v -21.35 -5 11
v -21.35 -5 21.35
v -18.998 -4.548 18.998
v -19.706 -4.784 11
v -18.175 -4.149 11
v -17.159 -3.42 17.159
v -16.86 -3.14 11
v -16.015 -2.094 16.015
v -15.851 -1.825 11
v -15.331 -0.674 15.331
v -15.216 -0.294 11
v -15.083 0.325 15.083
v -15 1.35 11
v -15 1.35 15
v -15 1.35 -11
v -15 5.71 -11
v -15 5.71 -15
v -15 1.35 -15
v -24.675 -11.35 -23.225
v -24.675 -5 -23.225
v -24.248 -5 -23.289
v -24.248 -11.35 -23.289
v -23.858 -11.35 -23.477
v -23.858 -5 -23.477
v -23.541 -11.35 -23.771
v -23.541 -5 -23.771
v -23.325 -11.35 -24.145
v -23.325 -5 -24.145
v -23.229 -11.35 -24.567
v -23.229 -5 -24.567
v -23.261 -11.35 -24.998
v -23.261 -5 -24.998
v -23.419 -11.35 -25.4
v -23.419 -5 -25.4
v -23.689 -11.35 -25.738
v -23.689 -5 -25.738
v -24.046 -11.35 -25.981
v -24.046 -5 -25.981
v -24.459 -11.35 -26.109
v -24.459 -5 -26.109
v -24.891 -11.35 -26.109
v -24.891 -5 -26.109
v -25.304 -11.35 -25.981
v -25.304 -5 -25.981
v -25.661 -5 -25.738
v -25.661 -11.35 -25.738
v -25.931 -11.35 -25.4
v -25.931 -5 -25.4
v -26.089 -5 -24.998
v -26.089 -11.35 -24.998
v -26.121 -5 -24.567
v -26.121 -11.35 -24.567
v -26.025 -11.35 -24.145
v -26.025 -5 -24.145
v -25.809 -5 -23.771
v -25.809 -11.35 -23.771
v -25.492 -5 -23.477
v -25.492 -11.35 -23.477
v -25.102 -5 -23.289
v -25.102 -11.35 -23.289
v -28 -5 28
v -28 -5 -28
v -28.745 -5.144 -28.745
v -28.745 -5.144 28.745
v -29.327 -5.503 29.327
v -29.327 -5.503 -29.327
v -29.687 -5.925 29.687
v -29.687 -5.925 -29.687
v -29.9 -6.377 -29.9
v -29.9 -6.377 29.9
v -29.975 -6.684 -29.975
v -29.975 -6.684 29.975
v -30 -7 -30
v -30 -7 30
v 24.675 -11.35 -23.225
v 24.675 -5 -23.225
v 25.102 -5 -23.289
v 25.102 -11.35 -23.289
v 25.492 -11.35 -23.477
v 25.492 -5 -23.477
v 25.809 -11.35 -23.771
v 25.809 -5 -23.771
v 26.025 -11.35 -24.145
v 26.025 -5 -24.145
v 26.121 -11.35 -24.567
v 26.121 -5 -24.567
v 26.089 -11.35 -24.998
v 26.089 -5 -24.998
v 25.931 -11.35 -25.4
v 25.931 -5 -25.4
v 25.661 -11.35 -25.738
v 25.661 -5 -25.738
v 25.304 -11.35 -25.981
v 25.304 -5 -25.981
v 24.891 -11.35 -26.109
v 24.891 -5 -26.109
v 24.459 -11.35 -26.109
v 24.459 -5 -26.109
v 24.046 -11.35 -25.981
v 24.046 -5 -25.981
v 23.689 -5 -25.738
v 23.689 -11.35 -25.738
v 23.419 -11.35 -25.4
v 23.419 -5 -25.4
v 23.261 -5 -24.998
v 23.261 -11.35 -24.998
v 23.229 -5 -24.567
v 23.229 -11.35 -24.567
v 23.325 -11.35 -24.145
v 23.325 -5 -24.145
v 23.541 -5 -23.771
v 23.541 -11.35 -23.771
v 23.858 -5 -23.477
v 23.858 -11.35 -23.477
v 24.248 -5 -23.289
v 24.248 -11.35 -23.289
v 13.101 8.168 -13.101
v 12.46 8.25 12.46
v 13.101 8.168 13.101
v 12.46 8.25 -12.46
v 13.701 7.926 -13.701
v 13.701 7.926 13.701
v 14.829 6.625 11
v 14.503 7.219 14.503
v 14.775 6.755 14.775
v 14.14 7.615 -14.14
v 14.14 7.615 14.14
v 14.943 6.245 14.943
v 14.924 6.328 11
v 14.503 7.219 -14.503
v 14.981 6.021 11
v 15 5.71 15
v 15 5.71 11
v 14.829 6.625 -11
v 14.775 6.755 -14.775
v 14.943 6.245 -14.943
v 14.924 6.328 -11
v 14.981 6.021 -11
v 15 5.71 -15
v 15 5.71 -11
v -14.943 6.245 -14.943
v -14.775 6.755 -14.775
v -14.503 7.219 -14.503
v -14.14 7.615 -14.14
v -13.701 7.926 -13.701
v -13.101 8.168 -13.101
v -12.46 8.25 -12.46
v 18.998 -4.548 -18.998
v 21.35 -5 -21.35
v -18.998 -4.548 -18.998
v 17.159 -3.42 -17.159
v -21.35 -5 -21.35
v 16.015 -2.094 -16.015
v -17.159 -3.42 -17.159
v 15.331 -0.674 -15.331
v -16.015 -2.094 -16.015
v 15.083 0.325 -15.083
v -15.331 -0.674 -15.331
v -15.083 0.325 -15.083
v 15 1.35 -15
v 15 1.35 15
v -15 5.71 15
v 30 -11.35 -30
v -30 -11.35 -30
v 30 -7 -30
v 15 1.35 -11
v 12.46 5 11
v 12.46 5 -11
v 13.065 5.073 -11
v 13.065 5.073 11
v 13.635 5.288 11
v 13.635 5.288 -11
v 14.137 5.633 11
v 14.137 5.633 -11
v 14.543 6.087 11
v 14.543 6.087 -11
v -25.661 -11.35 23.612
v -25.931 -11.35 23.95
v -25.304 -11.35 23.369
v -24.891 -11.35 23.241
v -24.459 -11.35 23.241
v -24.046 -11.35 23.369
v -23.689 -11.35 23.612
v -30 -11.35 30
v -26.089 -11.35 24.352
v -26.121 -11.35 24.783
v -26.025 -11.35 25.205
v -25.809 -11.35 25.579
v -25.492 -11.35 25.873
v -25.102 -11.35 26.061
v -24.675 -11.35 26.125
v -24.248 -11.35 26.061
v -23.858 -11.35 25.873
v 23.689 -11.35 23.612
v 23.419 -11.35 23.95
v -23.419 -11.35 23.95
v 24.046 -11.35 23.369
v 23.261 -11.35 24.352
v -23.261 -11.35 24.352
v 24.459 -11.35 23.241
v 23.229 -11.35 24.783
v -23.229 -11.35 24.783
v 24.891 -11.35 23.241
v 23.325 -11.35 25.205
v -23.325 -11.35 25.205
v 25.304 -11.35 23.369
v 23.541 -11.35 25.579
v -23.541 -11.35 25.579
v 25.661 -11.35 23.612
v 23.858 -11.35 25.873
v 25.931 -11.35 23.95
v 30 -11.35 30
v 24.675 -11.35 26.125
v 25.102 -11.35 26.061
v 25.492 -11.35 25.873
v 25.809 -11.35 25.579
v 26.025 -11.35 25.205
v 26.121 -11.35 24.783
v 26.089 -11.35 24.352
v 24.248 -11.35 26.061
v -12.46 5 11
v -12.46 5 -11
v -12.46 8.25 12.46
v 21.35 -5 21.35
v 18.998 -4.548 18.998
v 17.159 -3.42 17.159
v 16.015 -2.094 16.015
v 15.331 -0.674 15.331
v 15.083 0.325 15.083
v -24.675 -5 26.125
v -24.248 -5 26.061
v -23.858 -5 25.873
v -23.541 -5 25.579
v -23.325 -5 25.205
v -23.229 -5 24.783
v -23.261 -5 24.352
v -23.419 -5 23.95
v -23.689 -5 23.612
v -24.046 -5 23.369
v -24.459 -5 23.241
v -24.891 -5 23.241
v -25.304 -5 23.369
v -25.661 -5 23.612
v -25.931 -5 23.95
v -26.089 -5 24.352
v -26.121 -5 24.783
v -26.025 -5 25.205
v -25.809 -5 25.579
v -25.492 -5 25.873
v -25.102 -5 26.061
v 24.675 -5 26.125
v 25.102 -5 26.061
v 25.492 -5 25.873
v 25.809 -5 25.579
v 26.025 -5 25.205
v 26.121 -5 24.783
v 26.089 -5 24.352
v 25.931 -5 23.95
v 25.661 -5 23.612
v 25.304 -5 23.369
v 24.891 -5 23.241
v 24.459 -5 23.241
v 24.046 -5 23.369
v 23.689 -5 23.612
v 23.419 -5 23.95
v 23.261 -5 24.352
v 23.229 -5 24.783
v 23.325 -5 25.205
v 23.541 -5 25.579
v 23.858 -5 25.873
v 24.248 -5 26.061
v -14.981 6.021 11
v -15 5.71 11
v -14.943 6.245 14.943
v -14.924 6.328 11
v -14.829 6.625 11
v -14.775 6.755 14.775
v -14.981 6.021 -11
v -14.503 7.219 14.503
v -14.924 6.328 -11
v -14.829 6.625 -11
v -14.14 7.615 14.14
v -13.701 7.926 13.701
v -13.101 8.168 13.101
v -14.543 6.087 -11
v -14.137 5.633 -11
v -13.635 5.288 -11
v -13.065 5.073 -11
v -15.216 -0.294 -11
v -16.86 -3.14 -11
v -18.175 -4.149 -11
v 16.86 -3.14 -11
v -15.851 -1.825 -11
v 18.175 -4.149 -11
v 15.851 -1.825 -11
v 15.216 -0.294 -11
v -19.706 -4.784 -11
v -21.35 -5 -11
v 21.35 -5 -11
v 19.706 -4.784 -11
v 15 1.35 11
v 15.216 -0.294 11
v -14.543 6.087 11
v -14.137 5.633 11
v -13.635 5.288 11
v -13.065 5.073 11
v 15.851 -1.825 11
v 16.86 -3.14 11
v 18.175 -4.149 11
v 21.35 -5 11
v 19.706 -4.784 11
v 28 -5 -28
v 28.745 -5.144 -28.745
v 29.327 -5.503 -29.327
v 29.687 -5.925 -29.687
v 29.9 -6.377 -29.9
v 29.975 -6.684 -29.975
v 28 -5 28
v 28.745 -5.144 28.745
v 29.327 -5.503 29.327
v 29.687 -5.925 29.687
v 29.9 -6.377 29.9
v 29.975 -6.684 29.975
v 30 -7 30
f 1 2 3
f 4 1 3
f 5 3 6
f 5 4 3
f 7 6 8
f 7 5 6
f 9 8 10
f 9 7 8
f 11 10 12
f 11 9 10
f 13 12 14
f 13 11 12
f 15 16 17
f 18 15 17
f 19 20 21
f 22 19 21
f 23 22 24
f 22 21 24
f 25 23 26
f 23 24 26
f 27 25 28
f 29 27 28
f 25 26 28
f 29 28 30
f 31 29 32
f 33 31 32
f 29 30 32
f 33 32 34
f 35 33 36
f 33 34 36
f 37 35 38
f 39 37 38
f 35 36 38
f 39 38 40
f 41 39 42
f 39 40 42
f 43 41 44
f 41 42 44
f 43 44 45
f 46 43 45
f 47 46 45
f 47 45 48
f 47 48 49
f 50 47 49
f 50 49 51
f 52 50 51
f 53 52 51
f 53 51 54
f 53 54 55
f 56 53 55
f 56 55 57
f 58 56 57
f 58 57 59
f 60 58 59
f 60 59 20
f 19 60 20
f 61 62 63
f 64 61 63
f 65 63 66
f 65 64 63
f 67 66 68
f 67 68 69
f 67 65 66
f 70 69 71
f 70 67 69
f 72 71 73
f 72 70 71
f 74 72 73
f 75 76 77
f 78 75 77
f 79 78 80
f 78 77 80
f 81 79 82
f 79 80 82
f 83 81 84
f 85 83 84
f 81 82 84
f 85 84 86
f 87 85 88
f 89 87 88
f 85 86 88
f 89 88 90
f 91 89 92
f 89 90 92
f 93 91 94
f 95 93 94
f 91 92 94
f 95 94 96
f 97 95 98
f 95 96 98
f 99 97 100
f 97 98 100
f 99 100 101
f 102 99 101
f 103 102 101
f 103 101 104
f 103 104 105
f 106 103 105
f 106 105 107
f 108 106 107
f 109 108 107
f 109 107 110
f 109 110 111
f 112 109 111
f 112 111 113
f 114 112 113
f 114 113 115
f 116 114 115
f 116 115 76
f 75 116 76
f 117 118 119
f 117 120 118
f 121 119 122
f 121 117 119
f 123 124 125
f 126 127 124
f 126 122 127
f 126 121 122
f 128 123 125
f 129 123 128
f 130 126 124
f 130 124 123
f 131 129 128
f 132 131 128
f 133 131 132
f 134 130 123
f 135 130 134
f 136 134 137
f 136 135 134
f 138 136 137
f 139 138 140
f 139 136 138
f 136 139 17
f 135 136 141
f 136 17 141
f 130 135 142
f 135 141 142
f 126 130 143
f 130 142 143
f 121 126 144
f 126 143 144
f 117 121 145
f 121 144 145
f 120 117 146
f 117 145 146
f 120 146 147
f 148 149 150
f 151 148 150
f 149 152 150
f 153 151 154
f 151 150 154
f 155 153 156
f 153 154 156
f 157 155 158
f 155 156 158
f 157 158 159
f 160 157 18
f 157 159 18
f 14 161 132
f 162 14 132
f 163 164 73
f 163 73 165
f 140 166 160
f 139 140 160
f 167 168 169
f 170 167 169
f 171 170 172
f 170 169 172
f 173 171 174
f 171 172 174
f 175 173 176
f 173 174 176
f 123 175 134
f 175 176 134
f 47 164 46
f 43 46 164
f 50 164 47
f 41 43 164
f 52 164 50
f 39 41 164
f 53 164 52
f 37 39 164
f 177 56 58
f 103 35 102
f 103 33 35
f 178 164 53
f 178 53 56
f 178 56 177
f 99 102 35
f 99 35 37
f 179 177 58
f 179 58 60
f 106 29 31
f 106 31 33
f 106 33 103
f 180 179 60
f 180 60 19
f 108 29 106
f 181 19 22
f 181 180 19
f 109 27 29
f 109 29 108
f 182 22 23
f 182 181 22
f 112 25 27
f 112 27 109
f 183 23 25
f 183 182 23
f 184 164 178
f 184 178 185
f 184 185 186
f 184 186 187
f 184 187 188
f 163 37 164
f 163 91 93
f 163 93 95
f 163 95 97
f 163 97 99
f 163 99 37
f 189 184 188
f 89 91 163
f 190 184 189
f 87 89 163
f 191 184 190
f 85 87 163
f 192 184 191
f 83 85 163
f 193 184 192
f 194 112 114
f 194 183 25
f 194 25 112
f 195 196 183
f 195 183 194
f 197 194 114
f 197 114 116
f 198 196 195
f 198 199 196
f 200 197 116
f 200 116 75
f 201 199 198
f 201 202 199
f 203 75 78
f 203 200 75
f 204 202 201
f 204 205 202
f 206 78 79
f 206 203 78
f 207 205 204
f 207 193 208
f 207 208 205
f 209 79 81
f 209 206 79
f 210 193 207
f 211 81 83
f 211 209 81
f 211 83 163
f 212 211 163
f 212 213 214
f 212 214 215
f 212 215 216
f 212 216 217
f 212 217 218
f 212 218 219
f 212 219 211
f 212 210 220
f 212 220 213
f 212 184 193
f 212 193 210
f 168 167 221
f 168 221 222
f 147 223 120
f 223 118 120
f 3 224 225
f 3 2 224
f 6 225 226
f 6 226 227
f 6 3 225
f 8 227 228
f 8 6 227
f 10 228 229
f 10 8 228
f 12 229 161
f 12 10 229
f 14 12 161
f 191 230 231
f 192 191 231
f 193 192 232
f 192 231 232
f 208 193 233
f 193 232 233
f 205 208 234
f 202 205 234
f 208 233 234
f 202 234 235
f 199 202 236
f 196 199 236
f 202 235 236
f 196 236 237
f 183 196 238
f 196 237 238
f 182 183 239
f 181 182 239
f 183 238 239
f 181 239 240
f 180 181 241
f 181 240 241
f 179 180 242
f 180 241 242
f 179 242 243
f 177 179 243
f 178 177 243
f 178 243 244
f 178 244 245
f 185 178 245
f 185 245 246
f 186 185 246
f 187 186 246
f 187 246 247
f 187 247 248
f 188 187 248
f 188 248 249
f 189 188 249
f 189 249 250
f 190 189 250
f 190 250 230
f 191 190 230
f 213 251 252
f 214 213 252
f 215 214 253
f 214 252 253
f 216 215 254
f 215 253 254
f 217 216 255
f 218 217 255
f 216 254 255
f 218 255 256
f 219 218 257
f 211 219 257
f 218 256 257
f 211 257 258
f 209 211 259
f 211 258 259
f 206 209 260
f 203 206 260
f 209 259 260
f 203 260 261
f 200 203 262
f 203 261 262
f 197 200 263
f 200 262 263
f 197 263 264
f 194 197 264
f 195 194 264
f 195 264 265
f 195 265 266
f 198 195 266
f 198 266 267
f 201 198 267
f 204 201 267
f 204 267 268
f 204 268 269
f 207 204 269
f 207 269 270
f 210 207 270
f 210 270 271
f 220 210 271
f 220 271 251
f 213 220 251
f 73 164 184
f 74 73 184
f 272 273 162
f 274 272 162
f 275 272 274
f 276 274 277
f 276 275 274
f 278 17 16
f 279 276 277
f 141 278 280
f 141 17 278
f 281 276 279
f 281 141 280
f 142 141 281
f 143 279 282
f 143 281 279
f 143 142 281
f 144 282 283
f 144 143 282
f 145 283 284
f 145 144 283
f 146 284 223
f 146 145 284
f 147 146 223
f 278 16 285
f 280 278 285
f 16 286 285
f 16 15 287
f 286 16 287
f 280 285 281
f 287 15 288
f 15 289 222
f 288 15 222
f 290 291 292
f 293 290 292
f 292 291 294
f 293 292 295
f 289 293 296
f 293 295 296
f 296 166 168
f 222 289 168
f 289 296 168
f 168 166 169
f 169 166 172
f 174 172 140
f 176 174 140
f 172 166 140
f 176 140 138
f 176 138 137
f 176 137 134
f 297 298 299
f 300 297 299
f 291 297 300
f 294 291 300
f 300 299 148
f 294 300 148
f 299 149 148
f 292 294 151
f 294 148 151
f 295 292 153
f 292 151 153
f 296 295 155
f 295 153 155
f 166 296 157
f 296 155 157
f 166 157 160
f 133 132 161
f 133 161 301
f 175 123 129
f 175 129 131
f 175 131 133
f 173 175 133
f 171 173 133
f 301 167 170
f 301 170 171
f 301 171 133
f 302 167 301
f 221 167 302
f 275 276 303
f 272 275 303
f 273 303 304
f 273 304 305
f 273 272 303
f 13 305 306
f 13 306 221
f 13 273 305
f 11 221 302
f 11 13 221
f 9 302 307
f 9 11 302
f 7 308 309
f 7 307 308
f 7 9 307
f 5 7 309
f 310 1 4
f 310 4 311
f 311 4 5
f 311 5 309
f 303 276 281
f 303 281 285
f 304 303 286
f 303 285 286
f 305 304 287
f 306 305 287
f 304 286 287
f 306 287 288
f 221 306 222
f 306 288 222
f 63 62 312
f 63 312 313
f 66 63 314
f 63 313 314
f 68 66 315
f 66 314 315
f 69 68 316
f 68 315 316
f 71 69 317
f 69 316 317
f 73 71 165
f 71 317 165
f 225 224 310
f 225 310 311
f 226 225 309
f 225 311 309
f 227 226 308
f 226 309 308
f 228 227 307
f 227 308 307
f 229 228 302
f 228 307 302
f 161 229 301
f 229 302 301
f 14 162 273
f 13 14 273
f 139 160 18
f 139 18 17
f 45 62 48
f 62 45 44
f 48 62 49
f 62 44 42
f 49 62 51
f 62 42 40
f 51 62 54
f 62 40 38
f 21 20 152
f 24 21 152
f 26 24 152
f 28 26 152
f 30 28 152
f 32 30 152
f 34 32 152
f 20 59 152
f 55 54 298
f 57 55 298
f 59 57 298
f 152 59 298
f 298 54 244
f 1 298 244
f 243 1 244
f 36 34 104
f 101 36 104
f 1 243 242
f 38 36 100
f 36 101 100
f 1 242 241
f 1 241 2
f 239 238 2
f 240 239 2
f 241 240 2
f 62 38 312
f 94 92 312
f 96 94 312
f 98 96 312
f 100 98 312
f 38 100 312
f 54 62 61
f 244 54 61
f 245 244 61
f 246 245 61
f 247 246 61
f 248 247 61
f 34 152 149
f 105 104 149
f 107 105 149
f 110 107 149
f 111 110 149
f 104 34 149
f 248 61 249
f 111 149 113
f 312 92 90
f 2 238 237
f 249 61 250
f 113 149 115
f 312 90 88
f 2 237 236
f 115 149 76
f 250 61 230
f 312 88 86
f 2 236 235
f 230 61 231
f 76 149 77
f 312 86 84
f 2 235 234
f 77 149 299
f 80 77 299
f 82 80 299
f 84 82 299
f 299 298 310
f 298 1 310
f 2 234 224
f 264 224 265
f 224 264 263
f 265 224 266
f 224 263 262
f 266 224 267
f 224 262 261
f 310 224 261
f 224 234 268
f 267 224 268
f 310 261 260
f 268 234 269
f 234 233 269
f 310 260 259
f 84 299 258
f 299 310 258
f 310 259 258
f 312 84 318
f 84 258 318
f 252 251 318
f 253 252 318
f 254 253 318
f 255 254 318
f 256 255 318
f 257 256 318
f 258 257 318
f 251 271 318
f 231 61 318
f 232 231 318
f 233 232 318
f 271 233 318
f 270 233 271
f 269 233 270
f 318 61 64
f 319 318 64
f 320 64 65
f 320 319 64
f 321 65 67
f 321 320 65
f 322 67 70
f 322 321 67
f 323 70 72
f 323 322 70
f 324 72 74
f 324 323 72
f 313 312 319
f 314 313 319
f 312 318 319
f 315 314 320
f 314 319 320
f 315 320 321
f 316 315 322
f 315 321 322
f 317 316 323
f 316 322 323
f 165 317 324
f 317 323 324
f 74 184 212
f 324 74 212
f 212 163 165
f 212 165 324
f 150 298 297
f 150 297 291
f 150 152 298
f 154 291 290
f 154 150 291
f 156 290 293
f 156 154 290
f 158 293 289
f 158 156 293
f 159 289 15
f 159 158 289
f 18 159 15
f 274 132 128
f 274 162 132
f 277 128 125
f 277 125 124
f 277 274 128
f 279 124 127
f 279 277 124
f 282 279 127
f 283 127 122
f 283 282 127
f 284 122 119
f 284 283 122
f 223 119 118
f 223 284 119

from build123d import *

# Parameters (mm, degrees)
SKETCH2_W           = 30
SKETCH2_H           = 19.6
SKETCH2_W_2         = 22
SKETCH2_H_2         = 10
BOSS_EXTRUDE2_DEPTH = 15
SKETCH3_W           = 60
SKETCH3_H           = 60
BOSS_EXTRUDE3_DEPTH = 6.35
FILLET1_R           = 6.35
FILLET2_R           = 2.54
FILLET3_R           = 2.54
FILLET4_R           = 2
SKETCH4_R           = 1.45
CUT_EXTRUDE1_DEPTH  = 45.447300255


with BuildPart() as part:
    # Sketch2 → Boss-Extrude2 (new, symmetric)
    with BuildSketch(Plane(origin=(0, 0, 0), x_dir=(0, 0, -1), z_dir=(1, 0, 0))):
        with Locations((0, -1.55)):
            Rectangle(SKETCH2_W, SKETCH2_H)
        Rectangle(SKETCH2_W_2, SKETCH2_H_2, mode=Mode.SUBTRACT)
    extrude(amount=BOSS_EXTRUDE2_DEPTH, both=True)

    # Sketch3 → Boss-Extrude3 (add)
    with BuildSketch(Plane.XZ.offset(11.35)):
        Rectangle(SKETCH3_W, SKETCH3_H)
    extrude(amount=-BOSS_EXTRUDE3_DEPTH)

    # Fillet1
    fillet1_edges = [part.edges().sort_by_distance(p)[0] for p in [
        (-15, -5, 13),
        (-15, -5, -13),
        (0, -5, 15),
        (15, -5, 13),
        (15, -5, -13),
        (0, -5, -15),
    ]]
    fillet(fillet1_edges, radius=FILLET1_R)

    # Fillet2
    fillet2_edges = [part.edges().sort_by_distance(p)[0] for p in [
        (-15, 8.25, 0),
        (0, 8.25, 15),
        (0, 8.25, -15),
        (15, 8.25, 0),
    ]]
    fillet(fillet2_edges, radius=FILLET2_R)

    # Fillet3
    # the kernel refuses this fillet: 2.54 mm, written as the material it takes off along each edge
    with BuildSketch(Plane(origin=(-15, 5, -11), x_dir=(0, 1, 0), z_dir=(0, 0, 1))) as fillet3_piece_1:
        with BuildLine():
            CenterArc((FILLET3_R, -FILLET3_R), FILLET3_R, 90, 90)
            Line((0, -FILLET3_R), (0, 0))
            Line((0, 0), (FILLET3_R, 0))
        make_face()
    extrude(amount=22, mode=Mode.SUBTRACT)
    with BuildSketch(Plane(origin=(15, 5, -11), x_dir=(0, 1, 0), z_dir=(0, 0, 1))) as fillet3_piece_2:
        with BuildLine():
            CenterArc((FILLET3_R, FILLET3_R), FILLET3_R, 180, 90)
            Line((0, FILLET3_R), (0, 0))
            Line((0, 0), (FILLET3_R, 0))
        make_face()
    extrude(amount=22, mode=Mode.SUBTRACT)

    # Fillet4
    fillet4_edges = [part.edges().sort_by_distance(p)[0] for p in [
        (0, -5, -30),
        (30, -5, 0),
        (0, -5, 30),
        (-30, -5, 0),
    ]]
    fillet(fillet4_edges, radius=FILLET4_R)

    # Sketch4 → Cut-Extrude1 (cut, through all)
    with BuildSketch(Plane(origin=(0, -5, 0), x_dir=(1, 0, 0), z_dir=(0, 1, 0))):
        with Locations(Location((-24.675, 24.675, 0), (0, 0, 270))):
            Circle(SKETCH4_R)
        with Locations(Location((24.675, 24.675, 0), (0, 0, 270))):
            Circle(SKETCH4_R)
        with Locations(Location((24.675, -24.675, 0), (0, 0, 270))):
            Circle(SKETCH4_R)
        with Locations(Location((-24.675, -24.675, 0), (0, 0, 270))):
            Circle(SKETCH4_R)
    extrude(amount=-CUT_EXTRUDE1_DEPTH, mode=Mode.SUBTRACT)


solid = part.part
